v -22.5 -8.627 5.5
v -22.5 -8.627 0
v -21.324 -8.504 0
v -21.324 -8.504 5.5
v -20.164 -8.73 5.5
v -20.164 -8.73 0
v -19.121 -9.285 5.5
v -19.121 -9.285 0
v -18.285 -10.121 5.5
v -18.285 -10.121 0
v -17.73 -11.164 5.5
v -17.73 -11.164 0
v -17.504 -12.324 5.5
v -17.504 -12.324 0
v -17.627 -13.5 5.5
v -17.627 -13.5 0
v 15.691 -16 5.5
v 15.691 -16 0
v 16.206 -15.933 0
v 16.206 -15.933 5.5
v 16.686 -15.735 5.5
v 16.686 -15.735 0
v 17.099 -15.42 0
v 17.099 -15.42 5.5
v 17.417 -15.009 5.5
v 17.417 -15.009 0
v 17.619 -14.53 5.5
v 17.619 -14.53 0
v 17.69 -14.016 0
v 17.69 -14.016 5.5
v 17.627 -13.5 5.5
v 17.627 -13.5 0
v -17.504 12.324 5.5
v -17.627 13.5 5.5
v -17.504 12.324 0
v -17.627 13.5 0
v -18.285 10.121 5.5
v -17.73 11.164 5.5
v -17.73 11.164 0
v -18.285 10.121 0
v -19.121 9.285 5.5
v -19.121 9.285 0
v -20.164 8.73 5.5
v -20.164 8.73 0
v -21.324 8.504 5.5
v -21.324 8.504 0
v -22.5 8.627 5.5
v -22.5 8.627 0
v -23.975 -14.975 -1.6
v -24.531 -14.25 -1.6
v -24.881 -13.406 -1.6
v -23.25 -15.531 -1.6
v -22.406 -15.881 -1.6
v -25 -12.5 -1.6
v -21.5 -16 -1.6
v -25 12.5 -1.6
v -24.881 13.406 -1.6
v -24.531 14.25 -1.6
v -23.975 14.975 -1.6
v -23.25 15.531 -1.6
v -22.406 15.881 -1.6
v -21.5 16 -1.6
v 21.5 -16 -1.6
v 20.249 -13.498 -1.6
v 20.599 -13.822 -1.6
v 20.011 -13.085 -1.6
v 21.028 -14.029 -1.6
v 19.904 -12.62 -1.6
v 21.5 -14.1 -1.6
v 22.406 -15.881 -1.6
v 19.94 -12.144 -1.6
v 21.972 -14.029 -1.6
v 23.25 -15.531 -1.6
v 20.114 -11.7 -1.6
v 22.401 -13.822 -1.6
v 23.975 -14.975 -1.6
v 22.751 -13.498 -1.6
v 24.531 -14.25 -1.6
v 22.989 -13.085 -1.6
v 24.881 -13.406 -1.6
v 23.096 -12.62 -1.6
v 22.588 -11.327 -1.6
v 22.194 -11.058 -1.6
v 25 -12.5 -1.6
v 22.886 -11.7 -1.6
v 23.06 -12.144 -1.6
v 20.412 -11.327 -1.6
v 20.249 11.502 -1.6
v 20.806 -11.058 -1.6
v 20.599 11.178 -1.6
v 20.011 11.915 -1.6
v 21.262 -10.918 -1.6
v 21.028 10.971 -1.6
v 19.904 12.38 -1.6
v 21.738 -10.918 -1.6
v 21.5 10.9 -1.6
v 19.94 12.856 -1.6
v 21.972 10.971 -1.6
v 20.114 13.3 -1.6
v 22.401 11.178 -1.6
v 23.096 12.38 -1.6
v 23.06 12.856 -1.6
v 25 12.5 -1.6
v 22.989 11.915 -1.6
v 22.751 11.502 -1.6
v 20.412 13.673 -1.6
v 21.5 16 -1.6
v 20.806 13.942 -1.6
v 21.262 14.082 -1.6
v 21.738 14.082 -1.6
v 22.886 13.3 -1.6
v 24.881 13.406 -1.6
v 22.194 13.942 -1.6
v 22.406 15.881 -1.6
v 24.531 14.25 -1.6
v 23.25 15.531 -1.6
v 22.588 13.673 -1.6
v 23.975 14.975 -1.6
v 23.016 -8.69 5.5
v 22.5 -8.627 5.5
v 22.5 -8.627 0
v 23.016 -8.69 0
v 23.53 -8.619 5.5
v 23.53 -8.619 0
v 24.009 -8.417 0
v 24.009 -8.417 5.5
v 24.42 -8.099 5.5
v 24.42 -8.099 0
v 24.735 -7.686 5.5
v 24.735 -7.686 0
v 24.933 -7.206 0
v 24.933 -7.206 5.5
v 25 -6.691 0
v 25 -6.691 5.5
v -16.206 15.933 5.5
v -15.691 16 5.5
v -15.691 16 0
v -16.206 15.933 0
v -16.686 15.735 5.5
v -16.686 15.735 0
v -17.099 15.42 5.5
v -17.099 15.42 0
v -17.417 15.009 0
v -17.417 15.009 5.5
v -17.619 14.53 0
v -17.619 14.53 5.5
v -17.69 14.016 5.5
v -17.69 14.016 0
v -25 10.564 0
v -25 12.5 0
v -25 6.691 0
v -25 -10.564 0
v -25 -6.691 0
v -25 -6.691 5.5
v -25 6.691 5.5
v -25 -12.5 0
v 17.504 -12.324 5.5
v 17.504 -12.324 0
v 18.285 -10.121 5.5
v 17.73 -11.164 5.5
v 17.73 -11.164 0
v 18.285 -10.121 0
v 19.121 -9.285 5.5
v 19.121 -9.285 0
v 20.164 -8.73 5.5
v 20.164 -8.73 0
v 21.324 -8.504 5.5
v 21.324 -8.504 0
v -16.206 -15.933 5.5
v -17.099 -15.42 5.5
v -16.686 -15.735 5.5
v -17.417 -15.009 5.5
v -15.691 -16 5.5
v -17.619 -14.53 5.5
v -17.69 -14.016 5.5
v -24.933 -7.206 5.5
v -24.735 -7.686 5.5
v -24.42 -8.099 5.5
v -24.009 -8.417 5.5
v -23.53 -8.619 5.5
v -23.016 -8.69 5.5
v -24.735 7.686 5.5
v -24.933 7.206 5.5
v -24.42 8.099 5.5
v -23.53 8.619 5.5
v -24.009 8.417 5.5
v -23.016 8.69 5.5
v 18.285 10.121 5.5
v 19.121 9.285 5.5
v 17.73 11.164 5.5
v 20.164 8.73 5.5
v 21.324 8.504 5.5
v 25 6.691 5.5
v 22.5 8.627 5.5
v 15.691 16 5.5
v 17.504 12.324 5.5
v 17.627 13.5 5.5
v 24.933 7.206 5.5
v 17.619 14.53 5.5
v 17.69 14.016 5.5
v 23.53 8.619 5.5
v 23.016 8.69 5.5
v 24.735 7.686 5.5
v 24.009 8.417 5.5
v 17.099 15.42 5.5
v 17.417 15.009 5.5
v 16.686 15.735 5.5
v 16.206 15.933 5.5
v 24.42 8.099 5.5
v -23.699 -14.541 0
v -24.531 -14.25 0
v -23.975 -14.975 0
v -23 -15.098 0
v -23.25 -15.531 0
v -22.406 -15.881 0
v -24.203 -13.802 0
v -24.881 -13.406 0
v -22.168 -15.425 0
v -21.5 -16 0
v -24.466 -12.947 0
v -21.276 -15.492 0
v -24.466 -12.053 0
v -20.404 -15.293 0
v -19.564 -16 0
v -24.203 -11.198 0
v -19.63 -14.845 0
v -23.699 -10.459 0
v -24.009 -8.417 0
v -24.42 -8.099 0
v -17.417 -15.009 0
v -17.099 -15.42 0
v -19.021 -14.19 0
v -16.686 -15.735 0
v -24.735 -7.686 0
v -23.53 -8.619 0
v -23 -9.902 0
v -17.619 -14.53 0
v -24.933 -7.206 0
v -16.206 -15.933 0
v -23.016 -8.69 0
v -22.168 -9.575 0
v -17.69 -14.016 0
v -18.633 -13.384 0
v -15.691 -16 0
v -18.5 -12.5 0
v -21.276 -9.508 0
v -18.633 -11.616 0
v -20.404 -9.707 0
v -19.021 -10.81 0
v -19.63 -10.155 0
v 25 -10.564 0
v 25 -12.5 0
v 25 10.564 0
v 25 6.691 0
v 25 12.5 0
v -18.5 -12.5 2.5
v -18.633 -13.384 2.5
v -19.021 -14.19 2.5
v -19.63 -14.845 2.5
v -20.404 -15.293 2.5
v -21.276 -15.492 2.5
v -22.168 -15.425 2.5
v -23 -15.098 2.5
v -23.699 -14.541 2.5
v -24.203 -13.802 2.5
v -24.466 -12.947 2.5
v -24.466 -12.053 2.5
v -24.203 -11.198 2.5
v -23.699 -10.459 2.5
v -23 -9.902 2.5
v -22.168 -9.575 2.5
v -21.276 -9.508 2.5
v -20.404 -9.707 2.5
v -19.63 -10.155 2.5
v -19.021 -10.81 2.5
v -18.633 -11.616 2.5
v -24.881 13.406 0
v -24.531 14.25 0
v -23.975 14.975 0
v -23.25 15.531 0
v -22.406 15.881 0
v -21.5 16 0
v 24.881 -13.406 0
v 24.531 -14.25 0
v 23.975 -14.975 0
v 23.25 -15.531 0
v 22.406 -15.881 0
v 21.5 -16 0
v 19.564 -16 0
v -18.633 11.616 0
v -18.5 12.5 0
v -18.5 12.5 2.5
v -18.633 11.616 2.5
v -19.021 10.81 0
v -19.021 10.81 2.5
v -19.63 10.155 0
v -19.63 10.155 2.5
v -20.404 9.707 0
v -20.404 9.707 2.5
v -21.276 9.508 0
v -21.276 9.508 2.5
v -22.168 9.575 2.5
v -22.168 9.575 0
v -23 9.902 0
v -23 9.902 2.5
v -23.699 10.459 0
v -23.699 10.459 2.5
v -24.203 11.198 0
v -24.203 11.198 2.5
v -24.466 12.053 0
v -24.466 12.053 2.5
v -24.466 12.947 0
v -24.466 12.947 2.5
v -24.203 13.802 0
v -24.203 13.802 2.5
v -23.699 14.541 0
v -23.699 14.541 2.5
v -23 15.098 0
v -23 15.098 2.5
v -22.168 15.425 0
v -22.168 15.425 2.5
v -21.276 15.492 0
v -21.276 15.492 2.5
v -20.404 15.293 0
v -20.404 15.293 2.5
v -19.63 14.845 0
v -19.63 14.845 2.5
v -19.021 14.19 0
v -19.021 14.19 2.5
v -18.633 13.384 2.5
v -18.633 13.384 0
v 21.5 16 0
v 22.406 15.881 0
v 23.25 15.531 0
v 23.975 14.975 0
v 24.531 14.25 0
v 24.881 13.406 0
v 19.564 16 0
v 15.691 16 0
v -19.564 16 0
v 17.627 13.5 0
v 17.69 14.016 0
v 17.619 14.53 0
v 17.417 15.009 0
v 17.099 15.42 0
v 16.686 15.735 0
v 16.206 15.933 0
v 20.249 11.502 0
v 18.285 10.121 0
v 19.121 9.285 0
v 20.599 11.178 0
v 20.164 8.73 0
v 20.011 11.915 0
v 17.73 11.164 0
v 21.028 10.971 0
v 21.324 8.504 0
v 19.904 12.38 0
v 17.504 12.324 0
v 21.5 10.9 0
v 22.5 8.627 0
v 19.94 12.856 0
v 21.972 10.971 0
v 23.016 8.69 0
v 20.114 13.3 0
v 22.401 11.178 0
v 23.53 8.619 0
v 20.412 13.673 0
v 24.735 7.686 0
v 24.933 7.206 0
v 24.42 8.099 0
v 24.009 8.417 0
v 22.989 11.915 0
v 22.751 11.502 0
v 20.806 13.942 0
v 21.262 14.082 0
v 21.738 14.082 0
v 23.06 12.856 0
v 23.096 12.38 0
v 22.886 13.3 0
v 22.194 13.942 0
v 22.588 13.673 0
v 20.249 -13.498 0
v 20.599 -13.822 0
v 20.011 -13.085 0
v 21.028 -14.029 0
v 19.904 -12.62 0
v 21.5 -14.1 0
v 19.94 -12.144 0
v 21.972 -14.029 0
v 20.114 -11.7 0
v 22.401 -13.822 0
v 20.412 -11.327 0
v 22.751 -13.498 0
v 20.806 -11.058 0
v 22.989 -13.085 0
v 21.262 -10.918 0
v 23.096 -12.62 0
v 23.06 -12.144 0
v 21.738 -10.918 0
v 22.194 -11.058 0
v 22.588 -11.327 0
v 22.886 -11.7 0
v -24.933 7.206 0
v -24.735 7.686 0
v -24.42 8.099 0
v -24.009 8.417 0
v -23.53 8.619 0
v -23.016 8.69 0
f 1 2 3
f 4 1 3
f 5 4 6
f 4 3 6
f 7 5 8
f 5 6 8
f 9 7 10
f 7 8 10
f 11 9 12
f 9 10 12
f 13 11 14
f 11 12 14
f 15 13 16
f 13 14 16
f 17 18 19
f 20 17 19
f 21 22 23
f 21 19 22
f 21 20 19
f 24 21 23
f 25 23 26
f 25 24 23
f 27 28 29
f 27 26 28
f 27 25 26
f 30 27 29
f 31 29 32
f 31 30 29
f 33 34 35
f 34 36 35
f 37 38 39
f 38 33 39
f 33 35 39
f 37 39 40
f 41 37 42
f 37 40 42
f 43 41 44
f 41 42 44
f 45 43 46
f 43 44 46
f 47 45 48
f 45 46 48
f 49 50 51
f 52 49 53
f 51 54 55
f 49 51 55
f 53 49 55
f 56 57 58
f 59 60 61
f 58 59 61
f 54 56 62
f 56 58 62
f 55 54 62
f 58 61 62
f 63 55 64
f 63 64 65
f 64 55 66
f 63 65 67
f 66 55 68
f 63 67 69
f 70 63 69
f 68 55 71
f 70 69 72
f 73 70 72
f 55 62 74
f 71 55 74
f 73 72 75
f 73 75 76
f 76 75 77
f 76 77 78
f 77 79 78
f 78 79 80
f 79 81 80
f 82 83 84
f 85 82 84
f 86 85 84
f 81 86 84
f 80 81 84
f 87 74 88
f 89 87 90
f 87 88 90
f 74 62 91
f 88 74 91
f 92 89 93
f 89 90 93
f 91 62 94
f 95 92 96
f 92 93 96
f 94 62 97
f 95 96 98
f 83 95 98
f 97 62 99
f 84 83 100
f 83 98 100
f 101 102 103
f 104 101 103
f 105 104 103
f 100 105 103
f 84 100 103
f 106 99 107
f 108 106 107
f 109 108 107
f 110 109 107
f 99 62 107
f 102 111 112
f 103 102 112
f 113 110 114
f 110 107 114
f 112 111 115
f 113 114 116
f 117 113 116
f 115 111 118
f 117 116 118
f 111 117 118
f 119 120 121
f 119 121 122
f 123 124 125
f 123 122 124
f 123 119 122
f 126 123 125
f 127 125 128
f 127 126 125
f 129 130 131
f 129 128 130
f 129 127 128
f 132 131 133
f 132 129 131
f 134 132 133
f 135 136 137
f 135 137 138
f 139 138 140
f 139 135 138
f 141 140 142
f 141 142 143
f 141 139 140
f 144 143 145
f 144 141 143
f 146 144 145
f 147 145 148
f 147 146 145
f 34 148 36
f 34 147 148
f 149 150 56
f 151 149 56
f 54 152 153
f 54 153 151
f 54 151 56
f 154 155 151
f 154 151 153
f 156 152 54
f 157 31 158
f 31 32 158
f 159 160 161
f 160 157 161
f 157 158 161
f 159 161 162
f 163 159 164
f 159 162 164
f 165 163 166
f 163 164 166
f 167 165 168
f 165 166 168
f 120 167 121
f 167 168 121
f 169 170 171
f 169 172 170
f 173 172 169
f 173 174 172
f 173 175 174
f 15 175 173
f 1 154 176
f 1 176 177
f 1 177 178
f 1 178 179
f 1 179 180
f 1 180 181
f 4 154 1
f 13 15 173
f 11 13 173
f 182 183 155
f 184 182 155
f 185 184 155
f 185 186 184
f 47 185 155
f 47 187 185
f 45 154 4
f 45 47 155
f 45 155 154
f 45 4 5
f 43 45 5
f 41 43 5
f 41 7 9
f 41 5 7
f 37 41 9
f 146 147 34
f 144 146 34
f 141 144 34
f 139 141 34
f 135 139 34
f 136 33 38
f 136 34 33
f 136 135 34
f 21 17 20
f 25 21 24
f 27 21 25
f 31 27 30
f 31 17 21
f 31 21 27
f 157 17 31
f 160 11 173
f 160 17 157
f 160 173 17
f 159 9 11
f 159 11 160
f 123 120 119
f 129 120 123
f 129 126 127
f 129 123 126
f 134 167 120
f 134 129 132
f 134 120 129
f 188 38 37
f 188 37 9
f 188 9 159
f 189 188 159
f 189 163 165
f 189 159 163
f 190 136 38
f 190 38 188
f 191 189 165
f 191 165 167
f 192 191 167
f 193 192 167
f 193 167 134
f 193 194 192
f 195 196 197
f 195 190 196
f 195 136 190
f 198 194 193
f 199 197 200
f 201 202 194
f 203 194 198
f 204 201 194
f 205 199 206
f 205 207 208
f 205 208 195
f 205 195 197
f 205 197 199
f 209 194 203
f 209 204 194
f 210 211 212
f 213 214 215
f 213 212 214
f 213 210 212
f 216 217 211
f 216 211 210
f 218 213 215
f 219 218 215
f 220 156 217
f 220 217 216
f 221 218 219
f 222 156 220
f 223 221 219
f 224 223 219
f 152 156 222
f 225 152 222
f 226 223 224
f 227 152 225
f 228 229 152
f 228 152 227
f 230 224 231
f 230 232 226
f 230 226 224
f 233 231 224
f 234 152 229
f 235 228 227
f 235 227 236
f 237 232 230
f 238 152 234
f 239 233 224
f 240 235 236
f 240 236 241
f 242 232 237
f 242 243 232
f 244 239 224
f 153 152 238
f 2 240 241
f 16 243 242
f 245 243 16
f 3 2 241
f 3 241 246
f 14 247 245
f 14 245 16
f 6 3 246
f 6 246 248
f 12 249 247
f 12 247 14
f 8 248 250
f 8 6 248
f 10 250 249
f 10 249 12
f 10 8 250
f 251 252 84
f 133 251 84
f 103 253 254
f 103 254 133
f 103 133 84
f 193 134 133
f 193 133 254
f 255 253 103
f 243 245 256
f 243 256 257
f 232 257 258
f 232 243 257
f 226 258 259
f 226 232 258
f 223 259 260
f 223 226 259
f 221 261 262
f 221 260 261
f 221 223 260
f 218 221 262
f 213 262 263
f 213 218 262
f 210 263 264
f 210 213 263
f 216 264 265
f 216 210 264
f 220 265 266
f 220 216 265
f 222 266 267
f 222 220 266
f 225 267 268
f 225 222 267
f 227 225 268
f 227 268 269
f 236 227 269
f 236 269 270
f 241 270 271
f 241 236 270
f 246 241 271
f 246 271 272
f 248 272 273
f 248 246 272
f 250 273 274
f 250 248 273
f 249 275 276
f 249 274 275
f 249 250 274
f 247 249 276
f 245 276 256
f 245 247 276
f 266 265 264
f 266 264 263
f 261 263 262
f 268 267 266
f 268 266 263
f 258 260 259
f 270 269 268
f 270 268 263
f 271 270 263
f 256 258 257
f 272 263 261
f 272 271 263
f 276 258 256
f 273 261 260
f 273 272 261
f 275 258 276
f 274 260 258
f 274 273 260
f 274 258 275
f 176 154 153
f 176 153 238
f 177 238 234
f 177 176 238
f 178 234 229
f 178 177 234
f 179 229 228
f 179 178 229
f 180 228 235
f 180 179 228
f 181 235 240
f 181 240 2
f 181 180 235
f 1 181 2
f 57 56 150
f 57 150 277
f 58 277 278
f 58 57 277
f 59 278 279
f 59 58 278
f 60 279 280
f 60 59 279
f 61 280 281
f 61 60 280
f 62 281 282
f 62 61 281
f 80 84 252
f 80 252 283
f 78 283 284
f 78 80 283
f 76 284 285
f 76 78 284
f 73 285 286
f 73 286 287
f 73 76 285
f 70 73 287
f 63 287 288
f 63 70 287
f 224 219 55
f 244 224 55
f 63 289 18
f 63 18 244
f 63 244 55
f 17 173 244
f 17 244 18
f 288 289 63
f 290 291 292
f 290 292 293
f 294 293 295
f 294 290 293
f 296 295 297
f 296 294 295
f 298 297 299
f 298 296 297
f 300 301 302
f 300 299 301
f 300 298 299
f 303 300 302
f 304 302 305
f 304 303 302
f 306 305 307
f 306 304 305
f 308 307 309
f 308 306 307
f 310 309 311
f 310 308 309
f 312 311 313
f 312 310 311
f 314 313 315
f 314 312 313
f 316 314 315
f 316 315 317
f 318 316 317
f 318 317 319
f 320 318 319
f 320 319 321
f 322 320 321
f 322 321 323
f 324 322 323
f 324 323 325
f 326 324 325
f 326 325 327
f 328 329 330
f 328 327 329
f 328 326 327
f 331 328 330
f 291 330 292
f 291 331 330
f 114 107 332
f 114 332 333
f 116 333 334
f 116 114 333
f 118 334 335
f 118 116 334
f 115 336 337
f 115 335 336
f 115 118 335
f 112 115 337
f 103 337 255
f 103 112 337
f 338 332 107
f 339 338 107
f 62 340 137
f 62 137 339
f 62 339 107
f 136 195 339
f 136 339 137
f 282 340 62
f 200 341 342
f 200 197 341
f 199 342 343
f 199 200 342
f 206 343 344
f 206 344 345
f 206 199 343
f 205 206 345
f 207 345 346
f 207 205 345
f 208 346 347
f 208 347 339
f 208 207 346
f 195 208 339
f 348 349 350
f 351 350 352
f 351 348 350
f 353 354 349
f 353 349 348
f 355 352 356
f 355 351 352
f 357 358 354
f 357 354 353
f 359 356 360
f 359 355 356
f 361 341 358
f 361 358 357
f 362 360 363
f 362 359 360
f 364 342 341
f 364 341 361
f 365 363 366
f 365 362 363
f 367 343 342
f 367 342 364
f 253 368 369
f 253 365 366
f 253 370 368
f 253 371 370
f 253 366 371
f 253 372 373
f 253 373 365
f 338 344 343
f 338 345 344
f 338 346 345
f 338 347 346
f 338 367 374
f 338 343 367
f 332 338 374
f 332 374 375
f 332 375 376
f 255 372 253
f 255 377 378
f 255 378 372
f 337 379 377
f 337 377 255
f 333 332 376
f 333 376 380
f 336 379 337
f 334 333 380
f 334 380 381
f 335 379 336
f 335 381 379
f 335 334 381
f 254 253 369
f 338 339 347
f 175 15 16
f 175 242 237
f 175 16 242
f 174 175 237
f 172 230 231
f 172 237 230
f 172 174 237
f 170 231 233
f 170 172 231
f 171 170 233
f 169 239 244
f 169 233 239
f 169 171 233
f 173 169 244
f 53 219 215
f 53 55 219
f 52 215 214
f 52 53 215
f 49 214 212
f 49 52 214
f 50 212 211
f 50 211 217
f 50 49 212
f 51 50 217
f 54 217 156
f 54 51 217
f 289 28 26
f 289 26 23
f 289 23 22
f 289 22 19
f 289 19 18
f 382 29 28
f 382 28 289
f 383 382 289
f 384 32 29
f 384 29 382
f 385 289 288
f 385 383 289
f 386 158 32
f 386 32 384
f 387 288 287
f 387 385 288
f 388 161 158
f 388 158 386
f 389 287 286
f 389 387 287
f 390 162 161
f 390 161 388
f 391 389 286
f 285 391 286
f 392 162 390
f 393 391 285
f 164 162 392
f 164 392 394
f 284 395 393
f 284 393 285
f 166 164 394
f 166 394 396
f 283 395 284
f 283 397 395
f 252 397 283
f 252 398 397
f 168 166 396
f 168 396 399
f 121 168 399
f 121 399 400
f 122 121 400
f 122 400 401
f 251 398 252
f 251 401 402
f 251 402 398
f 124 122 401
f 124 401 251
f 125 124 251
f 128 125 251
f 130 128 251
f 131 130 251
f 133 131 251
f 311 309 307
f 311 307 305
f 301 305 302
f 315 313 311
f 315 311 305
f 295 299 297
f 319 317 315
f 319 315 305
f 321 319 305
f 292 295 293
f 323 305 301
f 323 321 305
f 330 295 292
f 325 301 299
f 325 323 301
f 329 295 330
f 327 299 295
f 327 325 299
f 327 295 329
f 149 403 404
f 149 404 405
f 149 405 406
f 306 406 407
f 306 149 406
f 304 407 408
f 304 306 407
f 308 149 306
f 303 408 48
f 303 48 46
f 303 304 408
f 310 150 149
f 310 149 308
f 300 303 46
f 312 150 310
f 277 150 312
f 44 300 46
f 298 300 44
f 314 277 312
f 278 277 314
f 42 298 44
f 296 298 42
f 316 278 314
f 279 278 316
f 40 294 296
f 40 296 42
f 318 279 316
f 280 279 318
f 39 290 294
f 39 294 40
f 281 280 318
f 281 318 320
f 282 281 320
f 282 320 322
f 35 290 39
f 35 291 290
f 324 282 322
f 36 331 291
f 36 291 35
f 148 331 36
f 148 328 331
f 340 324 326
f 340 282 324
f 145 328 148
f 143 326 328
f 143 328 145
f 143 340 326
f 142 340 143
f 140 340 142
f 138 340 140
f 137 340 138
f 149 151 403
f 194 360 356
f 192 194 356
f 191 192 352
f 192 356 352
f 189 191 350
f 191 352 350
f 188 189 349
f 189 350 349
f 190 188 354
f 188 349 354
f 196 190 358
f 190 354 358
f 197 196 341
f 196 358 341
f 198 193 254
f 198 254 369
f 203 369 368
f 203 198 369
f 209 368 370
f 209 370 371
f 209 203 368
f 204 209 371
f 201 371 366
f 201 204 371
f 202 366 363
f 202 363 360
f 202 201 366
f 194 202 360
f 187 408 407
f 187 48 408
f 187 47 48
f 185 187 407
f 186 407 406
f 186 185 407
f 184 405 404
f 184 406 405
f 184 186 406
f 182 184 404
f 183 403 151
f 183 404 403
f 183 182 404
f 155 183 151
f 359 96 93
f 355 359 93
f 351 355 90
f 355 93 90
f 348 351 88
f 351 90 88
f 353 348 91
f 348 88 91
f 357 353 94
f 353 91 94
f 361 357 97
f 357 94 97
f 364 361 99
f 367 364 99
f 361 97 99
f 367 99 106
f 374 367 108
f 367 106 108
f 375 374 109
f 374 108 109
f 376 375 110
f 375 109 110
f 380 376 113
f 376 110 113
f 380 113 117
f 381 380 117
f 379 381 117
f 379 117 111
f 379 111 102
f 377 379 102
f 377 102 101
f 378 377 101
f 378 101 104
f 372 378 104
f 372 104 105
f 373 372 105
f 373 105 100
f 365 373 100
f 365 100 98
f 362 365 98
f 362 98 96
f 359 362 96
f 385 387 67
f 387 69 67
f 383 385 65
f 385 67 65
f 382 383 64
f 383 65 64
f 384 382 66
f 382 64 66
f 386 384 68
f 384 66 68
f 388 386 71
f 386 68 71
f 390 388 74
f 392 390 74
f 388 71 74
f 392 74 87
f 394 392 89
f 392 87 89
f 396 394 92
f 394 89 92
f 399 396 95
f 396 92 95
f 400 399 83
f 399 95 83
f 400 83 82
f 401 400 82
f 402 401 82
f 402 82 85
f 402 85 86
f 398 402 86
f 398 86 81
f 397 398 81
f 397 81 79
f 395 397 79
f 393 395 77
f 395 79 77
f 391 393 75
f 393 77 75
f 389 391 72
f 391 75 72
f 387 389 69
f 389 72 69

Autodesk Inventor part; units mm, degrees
ref_plane "YZ Plane" through (0, 0, 0) normal (1, 0, 0) x (0, 1, 0)
ref_plane "XZ Plane" through (0, 0, 0) normal (0, 1, 0) x (-1, 0, 0)
ref_plane "XY Plane" through (0, 0, 0) normal (0, 0, 1) x (1, 0, 0)
sketch "Sketch1" plane through (0, 0, 0) normal (0, 0, 1) x (1, 0, 0)
  line L0 (25, 16) -> (-25, 16)
  line L1 (-25, 16) -> (-25, -16)
  line L2 (-25, -16) -> (25, -16)
  line L3 (25, -16) -> (25, 16)
  line L4 (25, 16) -> (-25, -16) construction
  line L5 (-25, 16) -> (25, -16) construction
  line L6 (0, 16) -> (0, -16) construction
  line L7 (25, 0) -> (-25, 0) construction
  line L8 (0, -16) -> (0, 16) construction
  line L9 (21.5, -12.5) -> (21.5, 12.5) construction
  circle A0 centre (-21.5, -12.5) radius 3
  circle A1 centre (-21.5, 12.5) radius 3
  arc A2 (-19.5635, -16) -> (-25, -10.5635) centre (-21.5, -12.5) ccw
  arc A3 (-25, 10.5635) -> (-19.5635, 16) centre (-21.5, 12.5) ccw
  arc A4 (25, -10.5635) -> (19.5635, -16) centre (21.5, -12.5) ccw
  arc A5 (19.5635, 16) -> (25, 10.5635) centre (21.5, 12.5) ccw
  point P0 (0, 0)
  point P1 (21.5, 0)
  point P2 (25, 10.5635)
  point P3 (19.5635, 16)
  point P4 (-19.5635, 16)
  point P5 (-25, 10.5635)
  point P6 (19.5635, -16)
  point P7 (25, -10.5635)
  dimension "d0" = 50
  dimension "d1" = 32
  dimension "d18" = 3.5
  dimension "d19" = 25
  dimension "d21" = 6
  dimension "d24" = 1
extrude "Extrusion1" add sketch "Sketch1" against normal blind 1.6 contours L3 A5 L0 | A5 L3 A4 L2 A2 L1 A3 L0 | A3 L1 L0 | L3 L2 A4 | A2 L2 L1 | A0 | A1
extrude "Extrusion2" add sketch "Sketch1" along normal blind 2.5 contours A0 | A1
hole "Phi3.2" at (21.5, -12.5, 0) at (21.5, 12.5, 0) direction (0, 0, -1) diameter 3.2 end through all
fillet "R3.5" radius 3.5 4 edges at (25, -16, -0.8) (-25, -16, -0.8) (-25, 16, -0.8) (25, 16, -0.8)
extrude "Extrusion3" add sketch "Sketch1" along normal blind 5.5 contours A5 L3 A4 L2 A2 L1 A3 L0
fillet "R2" radius 2 8 edges at (19.5635, -16, 2.75) (25, -10.5635, 2.75) (25, 10.5635, 2.75) (19.5635, 16, 2.75) (-19.5635, -16, 2.75) (-25, -10.5635, 2.75) (-25, 10.5635, 2.75) (-19.5635, 16, 2.75)
equation "\"d18\" = -0.5 * d19 + 0.5 * d1"
properties part number "SEN0539-EN" material "CFRP"
